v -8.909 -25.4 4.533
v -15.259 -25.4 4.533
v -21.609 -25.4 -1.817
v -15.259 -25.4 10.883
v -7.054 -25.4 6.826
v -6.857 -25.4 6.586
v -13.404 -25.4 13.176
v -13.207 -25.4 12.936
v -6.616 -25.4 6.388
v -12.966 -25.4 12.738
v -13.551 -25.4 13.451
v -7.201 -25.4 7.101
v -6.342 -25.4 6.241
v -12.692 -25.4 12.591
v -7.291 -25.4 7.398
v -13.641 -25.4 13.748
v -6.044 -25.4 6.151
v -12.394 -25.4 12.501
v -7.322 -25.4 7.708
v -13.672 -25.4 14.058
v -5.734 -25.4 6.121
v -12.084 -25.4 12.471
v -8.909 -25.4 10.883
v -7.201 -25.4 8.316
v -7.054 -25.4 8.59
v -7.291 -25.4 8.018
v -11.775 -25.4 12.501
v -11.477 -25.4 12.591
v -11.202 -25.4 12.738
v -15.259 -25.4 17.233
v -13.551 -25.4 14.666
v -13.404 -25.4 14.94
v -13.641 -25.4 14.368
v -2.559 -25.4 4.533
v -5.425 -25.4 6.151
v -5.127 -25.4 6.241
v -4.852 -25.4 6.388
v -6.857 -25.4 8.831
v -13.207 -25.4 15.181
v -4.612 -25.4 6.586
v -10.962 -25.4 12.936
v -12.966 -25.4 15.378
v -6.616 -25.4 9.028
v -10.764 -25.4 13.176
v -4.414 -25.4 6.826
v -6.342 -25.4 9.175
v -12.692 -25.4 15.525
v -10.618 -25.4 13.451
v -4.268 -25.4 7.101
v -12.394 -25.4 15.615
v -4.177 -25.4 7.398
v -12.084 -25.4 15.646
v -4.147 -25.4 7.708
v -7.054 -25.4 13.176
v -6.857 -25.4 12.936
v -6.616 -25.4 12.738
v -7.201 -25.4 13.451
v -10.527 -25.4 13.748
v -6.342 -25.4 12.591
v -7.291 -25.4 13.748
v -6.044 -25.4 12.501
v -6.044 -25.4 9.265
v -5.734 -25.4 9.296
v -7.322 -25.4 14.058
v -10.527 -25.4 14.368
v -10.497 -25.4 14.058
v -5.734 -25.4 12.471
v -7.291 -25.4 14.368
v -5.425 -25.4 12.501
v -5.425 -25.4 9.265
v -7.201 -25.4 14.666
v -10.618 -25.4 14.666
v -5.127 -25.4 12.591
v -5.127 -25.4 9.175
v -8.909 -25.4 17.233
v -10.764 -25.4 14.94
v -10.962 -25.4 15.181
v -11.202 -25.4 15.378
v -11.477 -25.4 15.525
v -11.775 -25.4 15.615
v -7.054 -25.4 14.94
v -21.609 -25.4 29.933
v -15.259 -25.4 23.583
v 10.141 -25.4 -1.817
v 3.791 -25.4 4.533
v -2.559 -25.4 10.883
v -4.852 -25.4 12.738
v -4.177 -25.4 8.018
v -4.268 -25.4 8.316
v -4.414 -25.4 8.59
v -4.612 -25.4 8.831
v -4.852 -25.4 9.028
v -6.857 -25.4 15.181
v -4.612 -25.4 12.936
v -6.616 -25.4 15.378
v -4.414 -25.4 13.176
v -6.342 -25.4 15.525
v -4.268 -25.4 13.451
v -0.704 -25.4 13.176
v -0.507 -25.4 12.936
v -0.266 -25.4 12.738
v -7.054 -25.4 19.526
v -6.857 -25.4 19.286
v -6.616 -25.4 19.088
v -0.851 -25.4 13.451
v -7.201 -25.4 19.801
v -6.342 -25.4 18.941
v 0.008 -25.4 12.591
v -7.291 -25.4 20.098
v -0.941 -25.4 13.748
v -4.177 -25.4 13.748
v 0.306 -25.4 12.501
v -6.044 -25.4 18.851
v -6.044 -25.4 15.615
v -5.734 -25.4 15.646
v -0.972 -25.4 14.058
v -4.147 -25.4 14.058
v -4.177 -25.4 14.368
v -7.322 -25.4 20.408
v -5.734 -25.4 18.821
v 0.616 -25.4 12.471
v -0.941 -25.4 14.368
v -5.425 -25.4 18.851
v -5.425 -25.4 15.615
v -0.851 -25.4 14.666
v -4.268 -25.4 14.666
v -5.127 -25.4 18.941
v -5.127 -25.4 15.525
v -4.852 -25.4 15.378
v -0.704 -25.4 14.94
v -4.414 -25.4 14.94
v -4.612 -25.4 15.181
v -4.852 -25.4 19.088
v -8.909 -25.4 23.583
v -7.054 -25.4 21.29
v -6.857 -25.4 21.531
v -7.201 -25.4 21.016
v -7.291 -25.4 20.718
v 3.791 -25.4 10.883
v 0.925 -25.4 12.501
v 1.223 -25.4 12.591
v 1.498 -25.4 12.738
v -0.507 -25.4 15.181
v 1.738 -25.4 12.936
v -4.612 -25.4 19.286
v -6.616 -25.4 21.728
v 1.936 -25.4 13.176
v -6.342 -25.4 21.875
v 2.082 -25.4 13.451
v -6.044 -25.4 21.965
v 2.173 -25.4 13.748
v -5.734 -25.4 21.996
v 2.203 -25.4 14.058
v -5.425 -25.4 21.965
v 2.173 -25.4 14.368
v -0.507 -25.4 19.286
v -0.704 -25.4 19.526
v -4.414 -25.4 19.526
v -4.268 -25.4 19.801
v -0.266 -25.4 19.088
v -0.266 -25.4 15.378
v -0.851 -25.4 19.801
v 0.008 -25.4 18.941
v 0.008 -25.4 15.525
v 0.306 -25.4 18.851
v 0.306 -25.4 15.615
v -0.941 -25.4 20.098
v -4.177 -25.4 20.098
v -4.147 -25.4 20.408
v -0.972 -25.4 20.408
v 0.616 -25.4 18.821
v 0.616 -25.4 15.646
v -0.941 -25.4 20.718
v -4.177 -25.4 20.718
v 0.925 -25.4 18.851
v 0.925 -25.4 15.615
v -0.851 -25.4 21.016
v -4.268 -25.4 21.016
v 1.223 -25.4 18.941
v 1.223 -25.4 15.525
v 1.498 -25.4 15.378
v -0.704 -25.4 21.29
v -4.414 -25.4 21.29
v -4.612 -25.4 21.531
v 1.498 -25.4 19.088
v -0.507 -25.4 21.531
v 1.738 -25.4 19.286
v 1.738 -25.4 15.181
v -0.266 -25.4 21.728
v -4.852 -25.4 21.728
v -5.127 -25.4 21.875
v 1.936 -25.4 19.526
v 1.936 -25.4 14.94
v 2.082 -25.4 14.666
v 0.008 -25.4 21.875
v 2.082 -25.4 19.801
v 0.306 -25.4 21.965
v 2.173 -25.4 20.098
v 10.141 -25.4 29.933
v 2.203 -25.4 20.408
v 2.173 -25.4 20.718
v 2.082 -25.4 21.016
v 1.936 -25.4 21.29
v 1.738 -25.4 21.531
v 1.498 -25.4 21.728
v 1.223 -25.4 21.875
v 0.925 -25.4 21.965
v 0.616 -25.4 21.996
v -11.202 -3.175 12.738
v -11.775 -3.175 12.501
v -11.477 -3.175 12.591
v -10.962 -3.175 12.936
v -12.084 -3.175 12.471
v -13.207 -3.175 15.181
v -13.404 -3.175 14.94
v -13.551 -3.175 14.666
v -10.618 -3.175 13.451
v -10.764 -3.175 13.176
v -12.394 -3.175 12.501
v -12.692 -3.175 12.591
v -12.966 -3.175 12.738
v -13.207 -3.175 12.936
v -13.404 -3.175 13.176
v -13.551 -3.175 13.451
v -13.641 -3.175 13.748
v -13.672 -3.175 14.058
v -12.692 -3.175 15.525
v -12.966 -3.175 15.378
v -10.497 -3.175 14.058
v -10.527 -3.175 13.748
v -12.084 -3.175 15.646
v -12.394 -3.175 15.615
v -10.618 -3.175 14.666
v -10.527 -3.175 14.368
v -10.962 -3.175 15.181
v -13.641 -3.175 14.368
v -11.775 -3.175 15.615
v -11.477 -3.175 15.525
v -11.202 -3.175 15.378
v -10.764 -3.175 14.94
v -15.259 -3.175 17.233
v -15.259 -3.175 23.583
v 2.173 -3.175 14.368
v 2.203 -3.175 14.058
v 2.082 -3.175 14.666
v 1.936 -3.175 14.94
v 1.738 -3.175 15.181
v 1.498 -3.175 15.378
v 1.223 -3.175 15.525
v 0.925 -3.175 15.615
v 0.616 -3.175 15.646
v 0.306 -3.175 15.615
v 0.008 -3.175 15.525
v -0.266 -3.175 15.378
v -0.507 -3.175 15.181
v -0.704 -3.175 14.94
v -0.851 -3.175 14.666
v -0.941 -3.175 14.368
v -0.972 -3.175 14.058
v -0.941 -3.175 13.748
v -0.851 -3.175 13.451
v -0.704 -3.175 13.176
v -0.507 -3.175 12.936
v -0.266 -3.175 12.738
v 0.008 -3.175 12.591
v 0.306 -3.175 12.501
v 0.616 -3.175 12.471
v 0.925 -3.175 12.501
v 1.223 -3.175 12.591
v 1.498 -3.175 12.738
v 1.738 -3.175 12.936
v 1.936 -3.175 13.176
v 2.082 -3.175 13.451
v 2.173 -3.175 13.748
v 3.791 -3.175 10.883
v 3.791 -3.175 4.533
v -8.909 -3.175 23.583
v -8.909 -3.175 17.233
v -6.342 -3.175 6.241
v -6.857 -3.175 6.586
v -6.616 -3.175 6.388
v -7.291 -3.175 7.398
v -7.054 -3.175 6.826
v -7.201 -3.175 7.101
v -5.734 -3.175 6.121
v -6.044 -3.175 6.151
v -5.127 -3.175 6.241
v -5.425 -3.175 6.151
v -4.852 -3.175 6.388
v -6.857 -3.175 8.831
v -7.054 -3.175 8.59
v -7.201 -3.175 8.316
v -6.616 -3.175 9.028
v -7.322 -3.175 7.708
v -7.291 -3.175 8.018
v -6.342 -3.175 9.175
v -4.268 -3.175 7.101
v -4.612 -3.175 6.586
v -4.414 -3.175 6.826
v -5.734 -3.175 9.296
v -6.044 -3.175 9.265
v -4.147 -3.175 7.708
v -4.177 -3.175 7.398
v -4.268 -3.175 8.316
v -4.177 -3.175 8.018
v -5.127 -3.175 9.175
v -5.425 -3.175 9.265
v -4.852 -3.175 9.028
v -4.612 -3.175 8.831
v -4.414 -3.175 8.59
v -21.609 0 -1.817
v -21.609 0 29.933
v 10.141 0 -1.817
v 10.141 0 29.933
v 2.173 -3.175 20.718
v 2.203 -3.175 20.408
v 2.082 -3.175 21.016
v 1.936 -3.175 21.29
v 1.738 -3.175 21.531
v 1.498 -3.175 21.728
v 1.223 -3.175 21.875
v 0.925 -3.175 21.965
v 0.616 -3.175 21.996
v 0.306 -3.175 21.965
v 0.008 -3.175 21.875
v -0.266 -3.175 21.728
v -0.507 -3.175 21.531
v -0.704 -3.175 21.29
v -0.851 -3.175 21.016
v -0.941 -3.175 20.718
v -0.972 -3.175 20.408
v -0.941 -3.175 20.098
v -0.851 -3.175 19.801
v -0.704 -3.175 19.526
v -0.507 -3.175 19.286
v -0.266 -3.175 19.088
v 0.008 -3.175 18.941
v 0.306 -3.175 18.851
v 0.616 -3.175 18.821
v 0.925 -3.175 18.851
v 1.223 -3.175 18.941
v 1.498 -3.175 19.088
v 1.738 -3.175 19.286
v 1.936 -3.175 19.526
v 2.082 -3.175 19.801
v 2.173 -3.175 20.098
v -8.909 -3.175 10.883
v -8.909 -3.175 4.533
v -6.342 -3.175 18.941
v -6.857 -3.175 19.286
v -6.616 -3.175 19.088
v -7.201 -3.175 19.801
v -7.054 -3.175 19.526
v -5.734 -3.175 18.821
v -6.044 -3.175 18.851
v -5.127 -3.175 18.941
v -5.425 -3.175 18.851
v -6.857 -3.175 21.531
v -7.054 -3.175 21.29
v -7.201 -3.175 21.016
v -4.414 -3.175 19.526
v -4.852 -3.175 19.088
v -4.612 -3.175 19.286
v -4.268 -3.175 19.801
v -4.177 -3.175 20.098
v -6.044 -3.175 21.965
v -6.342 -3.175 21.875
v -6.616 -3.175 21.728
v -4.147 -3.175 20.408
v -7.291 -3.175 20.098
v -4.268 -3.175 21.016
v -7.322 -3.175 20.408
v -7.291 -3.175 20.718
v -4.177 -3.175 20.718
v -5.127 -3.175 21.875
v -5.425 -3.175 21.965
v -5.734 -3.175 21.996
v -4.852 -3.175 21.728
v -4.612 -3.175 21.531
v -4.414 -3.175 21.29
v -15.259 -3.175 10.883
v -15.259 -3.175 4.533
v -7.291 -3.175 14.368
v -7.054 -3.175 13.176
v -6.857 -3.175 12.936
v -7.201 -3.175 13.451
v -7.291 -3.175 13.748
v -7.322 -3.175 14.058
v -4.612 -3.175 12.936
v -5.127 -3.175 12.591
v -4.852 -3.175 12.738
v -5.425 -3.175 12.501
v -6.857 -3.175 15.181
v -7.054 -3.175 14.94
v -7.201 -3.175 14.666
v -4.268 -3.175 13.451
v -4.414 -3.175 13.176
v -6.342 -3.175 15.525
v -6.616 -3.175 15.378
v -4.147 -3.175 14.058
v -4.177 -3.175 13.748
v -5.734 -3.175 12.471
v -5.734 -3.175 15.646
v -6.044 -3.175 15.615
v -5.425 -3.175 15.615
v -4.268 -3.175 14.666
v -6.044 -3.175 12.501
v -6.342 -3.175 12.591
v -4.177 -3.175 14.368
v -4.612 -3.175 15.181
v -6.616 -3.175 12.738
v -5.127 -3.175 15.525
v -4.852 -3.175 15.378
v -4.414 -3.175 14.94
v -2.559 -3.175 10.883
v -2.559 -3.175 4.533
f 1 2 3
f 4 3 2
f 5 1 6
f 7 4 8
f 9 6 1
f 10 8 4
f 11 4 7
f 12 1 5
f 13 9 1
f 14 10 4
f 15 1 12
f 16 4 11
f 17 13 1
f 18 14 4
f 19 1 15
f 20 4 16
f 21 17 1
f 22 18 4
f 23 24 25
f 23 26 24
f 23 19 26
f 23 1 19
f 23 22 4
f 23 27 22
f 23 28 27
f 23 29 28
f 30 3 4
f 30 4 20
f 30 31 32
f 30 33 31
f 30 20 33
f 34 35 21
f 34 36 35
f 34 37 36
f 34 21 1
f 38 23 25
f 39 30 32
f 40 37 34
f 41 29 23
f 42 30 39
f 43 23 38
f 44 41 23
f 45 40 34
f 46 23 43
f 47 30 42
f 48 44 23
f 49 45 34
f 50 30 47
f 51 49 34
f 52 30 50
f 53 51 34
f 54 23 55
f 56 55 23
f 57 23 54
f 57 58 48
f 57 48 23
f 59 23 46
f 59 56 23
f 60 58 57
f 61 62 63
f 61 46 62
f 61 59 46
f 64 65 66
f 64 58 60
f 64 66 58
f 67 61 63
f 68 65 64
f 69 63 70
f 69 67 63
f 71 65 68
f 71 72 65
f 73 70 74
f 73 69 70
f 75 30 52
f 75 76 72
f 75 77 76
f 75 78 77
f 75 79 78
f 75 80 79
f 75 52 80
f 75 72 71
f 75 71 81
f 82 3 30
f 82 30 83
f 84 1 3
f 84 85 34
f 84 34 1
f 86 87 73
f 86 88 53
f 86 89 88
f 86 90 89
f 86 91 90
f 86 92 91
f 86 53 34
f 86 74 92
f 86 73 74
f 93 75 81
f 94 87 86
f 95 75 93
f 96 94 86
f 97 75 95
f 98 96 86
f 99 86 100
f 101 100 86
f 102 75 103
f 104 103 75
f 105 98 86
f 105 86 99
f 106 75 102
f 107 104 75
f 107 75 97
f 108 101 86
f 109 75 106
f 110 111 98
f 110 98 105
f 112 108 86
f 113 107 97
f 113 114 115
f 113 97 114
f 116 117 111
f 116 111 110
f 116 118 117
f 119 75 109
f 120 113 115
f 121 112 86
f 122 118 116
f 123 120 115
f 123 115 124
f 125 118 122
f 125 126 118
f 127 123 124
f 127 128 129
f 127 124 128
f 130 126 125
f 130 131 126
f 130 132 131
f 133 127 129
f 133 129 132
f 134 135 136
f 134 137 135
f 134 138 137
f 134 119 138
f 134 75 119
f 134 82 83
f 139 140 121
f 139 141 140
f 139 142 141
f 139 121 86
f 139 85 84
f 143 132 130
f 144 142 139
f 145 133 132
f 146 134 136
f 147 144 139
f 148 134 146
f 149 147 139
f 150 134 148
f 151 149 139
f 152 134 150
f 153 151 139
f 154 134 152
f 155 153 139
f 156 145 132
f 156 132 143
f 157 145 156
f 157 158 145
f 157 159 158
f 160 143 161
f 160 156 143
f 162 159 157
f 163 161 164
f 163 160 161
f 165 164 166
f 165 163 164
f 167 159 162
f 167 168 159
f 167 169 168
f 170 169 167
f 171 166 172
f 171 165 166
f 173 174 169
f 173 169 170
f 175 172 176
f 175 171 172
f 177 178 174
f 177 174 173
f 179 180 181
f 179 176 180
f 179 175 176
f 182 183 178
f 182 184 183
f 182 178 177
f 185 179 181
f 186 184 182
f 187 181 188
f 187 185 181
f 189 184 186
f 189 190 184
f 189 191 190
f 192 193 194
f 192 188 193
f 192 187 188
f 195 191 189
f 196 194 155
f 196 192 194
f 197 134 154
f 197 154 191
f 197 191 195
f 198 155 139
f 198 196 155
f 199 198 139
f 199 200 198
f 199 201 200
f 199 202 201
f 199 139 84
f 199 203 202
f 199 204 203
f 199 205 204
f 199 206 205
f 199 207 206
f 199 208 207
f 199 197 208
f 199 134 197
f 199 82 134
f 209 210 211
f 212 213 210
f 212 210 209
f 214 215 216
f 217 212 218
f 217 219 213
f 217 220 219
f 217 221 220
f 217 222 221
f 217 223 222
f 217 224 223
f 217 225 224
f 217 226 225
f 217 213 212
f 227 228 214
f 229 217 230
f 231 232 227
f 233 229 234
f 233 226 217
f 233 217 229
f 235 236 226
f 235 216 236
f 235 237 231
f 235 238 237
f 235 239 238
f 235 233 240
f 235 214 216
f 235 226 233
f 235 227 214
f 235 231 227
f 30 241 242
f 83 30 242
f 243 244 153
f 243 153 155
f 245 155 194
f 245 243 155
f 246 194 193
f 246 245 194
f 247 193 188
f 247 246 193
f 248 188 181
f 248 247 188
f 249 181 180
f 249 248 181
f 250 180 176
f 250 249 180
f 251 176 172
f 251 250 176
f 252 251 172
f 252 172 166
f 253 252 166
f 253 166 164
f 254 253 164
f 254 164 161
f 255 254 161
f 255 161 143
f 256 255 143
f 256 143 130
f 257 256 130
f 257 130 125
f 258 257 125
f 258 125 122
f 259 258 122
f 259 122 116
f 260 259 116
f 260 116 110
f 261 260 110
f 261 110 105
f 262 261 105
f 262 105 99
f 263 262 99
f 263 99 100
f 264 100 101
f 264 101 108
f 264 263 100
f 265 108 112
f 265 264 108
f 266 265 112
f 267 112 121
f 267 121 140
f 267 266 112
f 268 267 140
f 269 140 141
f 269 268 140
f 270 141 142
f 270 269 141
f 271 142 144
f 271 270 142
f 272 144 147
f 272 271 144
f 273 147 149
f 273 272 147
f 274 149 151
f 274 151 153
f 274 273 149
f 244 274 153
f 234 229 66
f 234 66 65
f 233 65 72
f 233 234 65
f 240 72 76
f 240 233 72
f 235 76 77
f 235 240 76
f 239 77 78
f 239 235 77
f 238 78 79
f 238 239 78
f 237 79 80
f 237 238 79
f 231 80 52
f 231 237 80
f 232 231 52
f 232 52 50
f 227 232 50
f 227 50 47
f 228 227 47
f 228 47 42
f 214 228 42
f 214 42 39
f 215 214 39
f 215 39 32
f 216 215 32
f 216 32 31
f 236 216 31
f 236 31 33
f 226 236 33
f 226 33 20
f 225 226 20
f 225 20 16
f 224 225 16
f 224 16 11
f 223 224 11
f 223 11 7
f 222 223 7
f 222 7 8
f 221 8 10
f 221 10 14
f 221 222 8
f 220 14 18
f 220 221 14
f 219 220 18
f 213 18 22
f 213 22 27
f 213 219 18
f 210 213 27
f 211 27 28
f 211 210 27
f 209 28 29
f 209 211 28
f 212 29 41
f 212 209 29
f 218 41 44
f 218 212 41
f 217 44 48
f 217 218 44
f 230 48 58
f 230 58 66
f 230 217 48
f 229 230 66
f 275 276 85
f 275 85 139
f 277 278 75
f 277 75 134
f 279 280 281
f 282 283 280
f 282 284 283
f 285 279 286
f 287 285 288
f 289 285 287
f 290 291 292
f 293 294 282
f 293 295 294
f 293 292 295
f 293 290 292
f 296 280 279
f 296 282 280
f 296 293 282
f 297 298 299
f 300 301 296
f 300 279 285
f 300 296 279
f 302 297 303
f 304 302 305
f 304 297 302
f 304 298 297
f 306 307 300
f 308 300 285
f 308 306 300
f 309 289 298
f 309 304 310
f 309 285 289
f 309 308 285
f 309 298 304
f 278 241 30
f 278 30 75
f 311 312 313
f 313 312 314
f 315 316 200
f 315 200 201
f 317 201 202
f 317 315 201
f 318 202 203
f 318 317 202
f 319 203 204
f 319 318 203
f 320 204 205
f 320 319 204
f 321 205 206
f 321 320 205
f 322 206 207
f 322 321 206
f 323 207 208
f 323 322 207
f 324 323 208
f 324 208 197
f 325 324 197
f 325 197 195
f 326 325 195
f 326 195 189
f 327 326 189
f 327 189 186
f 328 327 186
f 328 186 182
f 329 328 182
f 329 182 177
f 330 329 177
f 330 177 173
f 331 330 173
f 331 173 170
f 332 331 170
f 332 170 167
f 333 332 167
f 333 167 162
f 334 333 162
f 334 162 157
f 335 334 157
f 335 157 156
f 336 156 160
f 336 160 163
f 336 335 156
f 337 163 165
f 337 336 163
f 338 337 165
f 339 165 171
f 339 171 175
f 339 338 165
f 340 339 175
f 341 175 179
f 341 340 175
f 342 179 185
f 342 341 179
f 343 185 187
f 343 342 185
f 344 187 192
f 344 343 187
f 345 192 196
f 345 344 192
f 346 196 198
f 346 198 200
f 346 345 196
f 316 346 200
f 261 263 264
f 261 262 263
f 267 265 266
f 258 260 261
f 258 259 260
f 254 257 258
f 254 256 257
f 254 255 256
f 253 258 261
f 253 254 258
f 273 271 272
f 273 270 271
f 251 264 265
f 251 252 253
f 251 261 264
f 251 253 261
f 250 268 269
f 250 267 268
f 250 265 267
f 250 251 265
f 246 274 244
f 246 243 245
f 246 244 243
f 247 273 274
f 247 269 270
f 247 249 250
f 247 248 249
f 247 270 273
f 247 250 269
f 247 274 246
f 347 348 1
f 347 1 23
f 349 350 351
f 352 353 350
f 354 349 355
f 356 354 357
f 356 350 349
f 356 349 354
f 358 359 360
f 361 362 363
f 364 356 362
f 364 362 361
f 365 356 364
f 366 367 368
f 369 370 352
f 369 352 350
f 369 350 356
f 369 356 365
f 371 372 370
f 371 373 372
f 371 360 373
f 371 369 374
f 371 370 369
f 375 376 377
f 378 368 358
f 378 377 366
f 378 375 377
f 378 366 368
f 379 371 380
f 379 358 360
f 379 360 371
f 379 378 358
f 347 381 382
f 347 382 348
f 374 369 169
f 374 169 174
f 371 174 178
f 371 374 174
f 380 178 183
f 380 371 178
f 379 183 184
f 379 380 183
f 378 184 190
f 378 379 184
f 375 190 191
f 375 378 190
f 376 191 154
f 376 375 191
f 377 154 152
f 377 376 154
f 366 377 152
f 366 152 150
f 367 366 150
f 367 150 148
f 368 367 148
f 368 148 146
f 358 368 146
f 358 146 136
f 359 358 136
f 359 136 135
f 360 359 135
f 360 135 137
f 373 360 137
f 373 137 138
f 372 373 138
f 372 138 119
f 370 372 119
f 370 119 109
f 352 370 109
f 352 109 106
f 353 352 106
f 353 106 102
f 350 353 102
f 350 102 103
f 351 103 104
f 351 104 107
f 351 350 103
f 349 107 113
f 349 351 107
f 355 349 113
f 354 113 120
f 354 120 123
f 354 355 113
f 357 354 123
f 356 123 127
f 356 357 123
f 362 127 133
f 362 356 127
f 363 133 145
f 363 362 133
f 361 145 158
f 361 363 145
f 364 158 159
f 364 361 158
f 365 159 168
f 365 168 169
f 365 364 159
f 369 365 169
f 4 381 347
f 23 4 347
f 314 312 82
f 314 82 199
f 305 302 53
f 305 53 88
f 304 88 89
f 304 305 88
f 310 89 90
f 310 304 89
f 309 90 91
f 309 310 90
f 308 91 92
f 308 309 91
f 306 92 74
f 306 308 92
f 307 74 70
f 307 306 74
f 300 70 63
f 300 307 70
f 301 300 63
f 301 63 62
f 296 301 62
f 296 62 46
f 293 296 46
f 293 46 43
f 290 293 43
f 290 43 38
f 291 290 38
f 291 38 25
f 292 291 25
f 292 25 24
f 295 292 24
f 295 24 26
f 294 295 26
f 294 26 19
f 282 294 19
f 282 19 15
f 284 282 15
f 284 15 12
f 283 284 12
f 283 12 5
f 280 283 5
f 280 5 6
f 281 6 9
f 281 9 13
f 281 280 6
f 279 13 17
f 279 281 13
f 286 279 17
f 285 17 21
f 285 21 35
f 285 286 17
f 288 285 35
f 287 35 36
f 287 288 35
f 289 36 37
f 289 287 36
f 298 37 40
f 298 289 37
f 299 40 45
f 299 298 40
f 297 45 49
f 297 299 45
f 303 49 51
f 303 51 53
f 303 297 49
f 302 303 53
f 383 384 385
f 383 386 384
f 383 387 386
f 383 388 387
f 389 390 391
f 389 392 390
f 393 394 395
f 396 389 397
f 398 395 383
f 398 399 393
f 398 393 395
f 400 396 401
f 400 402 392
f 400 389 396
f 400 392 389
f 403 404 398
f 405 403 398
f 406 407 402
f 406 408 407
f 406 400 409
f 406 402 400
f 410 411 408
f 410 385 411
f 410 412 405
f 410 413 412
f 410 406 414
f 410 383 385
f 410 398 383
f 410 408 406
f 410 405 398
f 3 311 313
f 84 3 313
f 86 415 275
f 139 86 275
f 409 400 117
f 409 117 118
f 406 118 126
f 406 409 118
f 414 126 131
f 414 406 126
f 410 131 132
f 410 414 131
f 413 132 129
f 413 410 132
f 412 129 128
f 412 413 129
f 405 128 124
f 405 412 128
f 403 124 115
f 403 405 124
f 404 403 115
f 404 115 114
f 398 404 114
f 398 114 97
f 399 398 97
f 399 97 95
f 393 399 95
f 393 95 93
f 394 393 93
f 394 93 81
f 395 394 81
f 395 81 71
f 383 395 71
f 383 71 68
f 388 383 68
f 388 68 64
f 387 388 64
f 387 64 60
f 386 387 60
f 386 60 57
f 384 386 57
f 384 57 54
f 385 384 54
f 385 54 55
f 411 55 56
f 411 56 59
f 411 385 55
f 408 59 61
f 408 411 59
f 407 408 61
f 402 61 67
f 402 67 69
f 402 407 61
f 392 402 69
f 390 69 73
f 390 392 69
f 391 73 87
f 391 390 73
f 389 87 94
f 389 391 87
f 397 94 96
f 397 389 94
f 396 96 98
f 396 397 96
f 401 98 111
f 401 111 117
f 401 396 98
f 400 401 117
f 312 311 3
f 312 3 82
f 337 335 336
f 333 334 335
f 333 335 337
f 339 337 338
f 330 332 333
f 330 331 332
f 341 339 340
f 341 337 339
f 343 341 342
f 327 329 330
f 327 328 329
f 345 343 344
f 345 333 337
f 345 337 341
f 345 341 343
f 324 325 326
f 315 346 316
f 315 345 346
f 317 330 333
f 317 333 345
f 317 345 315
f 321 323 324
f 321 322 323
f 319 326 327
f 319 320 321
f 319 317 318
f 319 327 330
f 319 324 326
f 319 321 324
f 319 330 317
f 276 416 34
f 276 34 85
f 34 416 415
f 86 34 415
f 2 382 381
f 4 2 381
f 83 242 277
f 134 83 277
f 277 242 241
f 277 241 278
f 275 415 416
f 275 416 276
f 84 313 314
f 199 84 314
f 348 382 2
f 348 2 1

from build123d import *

# Parameters (mm, degrees)
F0_W     = 31.75
F0_H     = 31.75
F0_W_2   = 6.35
F0_H_2   = 6.35
F0_R     = 1.5875
F1_DEPTH = 25.4
F2_DEPTH = 3.175


# Not quite as in the source:
# - a length typed as a fraction of an inch, garbled in the dataset ("3 / 203.2 mm" for 3/8 in), is restored


with BuildPart() as f1:
    # F0 (on Front) → F1 (new body)
    with BuildSketch(Plane.XZ):
        with Locations((-5.7344107546, 14.0581134118)):
            Rectangle(F0_W, F0_H)
        with Locations((-12.0844107546, 7.7081134118)):
            Rectangle(F0_W_2, F0_H_2, mode=Mode.SUBTRACT)
        with Locations((-12.0844107546, 14.0581134118)):
            Circle(F0_R, mode=Mode.SUBTRACT)
        with Locations((-5.7344107546, 7.7081134118)):
            Circle(F0_R, mode=Mode.SUBTRACT)
        with Locations((0.6155892454, 7.7081134118)):
            Rectangle(F0_W_2, F0_H_2, mode=Mode.SUBTRACT)
        with Locations((-5.7344107546, 14.0581134118)):
            Circle(F0_R, mode=Mode.SUBTRACT)
        with Locations((0.6155892454, 14.0581134118)):
            Circle(F0_R, mode=Mode.SUBTRACT)
        with Locations((-12.0844107546, 20.4081134118)):
            Rectangle(F0_W_2, F0_H_2, mode=Mode.SUBTRACT)
        with Locations((-5.7344107546, 20.4081134118)):
            Circle(F0_R, mode=Mode.SUBTRACT)
        with Locations((0.6155892454, 20.4081134118)):
            Circle(F0_R, mode=Mode.SUBTRACT)
    extrude(amount=F1_DEPTH)

    # F0 (on Front) → F2 (join)
    with BuildSketch(Plane.XZ):
        with Locations((-5.7344107546, 14.0581134118)):
            Rectangle(F0_W, F0_H)
        with Locations((-12.0844107546, 7.7081134118)):
            Rectangle(F0_W_2, F0_H_2, mode=Mode.SUBTRACT)
        with Locations((-12.0844107546, 14.0581134118)):
            Circle(F0_R, mode=Mode.SUBTRACT)
        with Locations((-5.7344107546, 7.7081134118)):
            Circle(F0_R, mode=Mode.SUBTRACT)
        with Locations((0.6155892454, 7.7081134118)):
            Rectangle(F0_W_2, F0_H_2, mode=Mode.SUBTRACT)
        with Locations((-5.7344107546, 14.0581134118)):
            Circle(F0_R, mode=Mode.SUBTRACT)
        with Locations((0.6155892454, 14.0581134118)):
            Circle(F0_R, mode=Mode.SUBTRACT)
        with Locations((-12.0844107546, 20.4081134118)):
            Rectangle(F0_W_2, F0_H_2, mode=Mode.SUBTRACT)
        with Locations((-5.7344107546, 20.4081134118)):
            Circle(F0_R, mode=Mode.SUBTRACT)
        with Locations((0.6155892454, 20.4081134118)):
            Circle(F0_R, mode=Mode.SUBTRACT)
        with Locations((-12.0844107546, 7.7081134118)):
            Rectangle(F0_W_2, F0_H_2)
        with Locations((-5.7344107546, 7.7081134118)):
            Circle(F0_R)
        with Locations((0.6155892454, 7.7081134118)):
            Rectangle(F0_W_2, F0_H_2)
        with Locations((0.6155892454, 14.0581134118)):
            Circle(F0_R)
        with Locations((-5.7344107546, 14.0581134118)):
            Circle(F0_R)
        with Locations((-12.0844107546, 14.0581134118)):
            Circle(F0_R)
        with Locations((-12.0844107546, 20.4081134118)):
            Rectangle(F0_W_2, F0_H_2)
        with Locations((-5.7344107546, 20.4081134118)):
            Circle(F0_R)
        with Locations((0.6155892454, 20.4081134118)):
            Circle(F0_R)
    extrude(amount=F2_DEPTH)


solid = f1.part
